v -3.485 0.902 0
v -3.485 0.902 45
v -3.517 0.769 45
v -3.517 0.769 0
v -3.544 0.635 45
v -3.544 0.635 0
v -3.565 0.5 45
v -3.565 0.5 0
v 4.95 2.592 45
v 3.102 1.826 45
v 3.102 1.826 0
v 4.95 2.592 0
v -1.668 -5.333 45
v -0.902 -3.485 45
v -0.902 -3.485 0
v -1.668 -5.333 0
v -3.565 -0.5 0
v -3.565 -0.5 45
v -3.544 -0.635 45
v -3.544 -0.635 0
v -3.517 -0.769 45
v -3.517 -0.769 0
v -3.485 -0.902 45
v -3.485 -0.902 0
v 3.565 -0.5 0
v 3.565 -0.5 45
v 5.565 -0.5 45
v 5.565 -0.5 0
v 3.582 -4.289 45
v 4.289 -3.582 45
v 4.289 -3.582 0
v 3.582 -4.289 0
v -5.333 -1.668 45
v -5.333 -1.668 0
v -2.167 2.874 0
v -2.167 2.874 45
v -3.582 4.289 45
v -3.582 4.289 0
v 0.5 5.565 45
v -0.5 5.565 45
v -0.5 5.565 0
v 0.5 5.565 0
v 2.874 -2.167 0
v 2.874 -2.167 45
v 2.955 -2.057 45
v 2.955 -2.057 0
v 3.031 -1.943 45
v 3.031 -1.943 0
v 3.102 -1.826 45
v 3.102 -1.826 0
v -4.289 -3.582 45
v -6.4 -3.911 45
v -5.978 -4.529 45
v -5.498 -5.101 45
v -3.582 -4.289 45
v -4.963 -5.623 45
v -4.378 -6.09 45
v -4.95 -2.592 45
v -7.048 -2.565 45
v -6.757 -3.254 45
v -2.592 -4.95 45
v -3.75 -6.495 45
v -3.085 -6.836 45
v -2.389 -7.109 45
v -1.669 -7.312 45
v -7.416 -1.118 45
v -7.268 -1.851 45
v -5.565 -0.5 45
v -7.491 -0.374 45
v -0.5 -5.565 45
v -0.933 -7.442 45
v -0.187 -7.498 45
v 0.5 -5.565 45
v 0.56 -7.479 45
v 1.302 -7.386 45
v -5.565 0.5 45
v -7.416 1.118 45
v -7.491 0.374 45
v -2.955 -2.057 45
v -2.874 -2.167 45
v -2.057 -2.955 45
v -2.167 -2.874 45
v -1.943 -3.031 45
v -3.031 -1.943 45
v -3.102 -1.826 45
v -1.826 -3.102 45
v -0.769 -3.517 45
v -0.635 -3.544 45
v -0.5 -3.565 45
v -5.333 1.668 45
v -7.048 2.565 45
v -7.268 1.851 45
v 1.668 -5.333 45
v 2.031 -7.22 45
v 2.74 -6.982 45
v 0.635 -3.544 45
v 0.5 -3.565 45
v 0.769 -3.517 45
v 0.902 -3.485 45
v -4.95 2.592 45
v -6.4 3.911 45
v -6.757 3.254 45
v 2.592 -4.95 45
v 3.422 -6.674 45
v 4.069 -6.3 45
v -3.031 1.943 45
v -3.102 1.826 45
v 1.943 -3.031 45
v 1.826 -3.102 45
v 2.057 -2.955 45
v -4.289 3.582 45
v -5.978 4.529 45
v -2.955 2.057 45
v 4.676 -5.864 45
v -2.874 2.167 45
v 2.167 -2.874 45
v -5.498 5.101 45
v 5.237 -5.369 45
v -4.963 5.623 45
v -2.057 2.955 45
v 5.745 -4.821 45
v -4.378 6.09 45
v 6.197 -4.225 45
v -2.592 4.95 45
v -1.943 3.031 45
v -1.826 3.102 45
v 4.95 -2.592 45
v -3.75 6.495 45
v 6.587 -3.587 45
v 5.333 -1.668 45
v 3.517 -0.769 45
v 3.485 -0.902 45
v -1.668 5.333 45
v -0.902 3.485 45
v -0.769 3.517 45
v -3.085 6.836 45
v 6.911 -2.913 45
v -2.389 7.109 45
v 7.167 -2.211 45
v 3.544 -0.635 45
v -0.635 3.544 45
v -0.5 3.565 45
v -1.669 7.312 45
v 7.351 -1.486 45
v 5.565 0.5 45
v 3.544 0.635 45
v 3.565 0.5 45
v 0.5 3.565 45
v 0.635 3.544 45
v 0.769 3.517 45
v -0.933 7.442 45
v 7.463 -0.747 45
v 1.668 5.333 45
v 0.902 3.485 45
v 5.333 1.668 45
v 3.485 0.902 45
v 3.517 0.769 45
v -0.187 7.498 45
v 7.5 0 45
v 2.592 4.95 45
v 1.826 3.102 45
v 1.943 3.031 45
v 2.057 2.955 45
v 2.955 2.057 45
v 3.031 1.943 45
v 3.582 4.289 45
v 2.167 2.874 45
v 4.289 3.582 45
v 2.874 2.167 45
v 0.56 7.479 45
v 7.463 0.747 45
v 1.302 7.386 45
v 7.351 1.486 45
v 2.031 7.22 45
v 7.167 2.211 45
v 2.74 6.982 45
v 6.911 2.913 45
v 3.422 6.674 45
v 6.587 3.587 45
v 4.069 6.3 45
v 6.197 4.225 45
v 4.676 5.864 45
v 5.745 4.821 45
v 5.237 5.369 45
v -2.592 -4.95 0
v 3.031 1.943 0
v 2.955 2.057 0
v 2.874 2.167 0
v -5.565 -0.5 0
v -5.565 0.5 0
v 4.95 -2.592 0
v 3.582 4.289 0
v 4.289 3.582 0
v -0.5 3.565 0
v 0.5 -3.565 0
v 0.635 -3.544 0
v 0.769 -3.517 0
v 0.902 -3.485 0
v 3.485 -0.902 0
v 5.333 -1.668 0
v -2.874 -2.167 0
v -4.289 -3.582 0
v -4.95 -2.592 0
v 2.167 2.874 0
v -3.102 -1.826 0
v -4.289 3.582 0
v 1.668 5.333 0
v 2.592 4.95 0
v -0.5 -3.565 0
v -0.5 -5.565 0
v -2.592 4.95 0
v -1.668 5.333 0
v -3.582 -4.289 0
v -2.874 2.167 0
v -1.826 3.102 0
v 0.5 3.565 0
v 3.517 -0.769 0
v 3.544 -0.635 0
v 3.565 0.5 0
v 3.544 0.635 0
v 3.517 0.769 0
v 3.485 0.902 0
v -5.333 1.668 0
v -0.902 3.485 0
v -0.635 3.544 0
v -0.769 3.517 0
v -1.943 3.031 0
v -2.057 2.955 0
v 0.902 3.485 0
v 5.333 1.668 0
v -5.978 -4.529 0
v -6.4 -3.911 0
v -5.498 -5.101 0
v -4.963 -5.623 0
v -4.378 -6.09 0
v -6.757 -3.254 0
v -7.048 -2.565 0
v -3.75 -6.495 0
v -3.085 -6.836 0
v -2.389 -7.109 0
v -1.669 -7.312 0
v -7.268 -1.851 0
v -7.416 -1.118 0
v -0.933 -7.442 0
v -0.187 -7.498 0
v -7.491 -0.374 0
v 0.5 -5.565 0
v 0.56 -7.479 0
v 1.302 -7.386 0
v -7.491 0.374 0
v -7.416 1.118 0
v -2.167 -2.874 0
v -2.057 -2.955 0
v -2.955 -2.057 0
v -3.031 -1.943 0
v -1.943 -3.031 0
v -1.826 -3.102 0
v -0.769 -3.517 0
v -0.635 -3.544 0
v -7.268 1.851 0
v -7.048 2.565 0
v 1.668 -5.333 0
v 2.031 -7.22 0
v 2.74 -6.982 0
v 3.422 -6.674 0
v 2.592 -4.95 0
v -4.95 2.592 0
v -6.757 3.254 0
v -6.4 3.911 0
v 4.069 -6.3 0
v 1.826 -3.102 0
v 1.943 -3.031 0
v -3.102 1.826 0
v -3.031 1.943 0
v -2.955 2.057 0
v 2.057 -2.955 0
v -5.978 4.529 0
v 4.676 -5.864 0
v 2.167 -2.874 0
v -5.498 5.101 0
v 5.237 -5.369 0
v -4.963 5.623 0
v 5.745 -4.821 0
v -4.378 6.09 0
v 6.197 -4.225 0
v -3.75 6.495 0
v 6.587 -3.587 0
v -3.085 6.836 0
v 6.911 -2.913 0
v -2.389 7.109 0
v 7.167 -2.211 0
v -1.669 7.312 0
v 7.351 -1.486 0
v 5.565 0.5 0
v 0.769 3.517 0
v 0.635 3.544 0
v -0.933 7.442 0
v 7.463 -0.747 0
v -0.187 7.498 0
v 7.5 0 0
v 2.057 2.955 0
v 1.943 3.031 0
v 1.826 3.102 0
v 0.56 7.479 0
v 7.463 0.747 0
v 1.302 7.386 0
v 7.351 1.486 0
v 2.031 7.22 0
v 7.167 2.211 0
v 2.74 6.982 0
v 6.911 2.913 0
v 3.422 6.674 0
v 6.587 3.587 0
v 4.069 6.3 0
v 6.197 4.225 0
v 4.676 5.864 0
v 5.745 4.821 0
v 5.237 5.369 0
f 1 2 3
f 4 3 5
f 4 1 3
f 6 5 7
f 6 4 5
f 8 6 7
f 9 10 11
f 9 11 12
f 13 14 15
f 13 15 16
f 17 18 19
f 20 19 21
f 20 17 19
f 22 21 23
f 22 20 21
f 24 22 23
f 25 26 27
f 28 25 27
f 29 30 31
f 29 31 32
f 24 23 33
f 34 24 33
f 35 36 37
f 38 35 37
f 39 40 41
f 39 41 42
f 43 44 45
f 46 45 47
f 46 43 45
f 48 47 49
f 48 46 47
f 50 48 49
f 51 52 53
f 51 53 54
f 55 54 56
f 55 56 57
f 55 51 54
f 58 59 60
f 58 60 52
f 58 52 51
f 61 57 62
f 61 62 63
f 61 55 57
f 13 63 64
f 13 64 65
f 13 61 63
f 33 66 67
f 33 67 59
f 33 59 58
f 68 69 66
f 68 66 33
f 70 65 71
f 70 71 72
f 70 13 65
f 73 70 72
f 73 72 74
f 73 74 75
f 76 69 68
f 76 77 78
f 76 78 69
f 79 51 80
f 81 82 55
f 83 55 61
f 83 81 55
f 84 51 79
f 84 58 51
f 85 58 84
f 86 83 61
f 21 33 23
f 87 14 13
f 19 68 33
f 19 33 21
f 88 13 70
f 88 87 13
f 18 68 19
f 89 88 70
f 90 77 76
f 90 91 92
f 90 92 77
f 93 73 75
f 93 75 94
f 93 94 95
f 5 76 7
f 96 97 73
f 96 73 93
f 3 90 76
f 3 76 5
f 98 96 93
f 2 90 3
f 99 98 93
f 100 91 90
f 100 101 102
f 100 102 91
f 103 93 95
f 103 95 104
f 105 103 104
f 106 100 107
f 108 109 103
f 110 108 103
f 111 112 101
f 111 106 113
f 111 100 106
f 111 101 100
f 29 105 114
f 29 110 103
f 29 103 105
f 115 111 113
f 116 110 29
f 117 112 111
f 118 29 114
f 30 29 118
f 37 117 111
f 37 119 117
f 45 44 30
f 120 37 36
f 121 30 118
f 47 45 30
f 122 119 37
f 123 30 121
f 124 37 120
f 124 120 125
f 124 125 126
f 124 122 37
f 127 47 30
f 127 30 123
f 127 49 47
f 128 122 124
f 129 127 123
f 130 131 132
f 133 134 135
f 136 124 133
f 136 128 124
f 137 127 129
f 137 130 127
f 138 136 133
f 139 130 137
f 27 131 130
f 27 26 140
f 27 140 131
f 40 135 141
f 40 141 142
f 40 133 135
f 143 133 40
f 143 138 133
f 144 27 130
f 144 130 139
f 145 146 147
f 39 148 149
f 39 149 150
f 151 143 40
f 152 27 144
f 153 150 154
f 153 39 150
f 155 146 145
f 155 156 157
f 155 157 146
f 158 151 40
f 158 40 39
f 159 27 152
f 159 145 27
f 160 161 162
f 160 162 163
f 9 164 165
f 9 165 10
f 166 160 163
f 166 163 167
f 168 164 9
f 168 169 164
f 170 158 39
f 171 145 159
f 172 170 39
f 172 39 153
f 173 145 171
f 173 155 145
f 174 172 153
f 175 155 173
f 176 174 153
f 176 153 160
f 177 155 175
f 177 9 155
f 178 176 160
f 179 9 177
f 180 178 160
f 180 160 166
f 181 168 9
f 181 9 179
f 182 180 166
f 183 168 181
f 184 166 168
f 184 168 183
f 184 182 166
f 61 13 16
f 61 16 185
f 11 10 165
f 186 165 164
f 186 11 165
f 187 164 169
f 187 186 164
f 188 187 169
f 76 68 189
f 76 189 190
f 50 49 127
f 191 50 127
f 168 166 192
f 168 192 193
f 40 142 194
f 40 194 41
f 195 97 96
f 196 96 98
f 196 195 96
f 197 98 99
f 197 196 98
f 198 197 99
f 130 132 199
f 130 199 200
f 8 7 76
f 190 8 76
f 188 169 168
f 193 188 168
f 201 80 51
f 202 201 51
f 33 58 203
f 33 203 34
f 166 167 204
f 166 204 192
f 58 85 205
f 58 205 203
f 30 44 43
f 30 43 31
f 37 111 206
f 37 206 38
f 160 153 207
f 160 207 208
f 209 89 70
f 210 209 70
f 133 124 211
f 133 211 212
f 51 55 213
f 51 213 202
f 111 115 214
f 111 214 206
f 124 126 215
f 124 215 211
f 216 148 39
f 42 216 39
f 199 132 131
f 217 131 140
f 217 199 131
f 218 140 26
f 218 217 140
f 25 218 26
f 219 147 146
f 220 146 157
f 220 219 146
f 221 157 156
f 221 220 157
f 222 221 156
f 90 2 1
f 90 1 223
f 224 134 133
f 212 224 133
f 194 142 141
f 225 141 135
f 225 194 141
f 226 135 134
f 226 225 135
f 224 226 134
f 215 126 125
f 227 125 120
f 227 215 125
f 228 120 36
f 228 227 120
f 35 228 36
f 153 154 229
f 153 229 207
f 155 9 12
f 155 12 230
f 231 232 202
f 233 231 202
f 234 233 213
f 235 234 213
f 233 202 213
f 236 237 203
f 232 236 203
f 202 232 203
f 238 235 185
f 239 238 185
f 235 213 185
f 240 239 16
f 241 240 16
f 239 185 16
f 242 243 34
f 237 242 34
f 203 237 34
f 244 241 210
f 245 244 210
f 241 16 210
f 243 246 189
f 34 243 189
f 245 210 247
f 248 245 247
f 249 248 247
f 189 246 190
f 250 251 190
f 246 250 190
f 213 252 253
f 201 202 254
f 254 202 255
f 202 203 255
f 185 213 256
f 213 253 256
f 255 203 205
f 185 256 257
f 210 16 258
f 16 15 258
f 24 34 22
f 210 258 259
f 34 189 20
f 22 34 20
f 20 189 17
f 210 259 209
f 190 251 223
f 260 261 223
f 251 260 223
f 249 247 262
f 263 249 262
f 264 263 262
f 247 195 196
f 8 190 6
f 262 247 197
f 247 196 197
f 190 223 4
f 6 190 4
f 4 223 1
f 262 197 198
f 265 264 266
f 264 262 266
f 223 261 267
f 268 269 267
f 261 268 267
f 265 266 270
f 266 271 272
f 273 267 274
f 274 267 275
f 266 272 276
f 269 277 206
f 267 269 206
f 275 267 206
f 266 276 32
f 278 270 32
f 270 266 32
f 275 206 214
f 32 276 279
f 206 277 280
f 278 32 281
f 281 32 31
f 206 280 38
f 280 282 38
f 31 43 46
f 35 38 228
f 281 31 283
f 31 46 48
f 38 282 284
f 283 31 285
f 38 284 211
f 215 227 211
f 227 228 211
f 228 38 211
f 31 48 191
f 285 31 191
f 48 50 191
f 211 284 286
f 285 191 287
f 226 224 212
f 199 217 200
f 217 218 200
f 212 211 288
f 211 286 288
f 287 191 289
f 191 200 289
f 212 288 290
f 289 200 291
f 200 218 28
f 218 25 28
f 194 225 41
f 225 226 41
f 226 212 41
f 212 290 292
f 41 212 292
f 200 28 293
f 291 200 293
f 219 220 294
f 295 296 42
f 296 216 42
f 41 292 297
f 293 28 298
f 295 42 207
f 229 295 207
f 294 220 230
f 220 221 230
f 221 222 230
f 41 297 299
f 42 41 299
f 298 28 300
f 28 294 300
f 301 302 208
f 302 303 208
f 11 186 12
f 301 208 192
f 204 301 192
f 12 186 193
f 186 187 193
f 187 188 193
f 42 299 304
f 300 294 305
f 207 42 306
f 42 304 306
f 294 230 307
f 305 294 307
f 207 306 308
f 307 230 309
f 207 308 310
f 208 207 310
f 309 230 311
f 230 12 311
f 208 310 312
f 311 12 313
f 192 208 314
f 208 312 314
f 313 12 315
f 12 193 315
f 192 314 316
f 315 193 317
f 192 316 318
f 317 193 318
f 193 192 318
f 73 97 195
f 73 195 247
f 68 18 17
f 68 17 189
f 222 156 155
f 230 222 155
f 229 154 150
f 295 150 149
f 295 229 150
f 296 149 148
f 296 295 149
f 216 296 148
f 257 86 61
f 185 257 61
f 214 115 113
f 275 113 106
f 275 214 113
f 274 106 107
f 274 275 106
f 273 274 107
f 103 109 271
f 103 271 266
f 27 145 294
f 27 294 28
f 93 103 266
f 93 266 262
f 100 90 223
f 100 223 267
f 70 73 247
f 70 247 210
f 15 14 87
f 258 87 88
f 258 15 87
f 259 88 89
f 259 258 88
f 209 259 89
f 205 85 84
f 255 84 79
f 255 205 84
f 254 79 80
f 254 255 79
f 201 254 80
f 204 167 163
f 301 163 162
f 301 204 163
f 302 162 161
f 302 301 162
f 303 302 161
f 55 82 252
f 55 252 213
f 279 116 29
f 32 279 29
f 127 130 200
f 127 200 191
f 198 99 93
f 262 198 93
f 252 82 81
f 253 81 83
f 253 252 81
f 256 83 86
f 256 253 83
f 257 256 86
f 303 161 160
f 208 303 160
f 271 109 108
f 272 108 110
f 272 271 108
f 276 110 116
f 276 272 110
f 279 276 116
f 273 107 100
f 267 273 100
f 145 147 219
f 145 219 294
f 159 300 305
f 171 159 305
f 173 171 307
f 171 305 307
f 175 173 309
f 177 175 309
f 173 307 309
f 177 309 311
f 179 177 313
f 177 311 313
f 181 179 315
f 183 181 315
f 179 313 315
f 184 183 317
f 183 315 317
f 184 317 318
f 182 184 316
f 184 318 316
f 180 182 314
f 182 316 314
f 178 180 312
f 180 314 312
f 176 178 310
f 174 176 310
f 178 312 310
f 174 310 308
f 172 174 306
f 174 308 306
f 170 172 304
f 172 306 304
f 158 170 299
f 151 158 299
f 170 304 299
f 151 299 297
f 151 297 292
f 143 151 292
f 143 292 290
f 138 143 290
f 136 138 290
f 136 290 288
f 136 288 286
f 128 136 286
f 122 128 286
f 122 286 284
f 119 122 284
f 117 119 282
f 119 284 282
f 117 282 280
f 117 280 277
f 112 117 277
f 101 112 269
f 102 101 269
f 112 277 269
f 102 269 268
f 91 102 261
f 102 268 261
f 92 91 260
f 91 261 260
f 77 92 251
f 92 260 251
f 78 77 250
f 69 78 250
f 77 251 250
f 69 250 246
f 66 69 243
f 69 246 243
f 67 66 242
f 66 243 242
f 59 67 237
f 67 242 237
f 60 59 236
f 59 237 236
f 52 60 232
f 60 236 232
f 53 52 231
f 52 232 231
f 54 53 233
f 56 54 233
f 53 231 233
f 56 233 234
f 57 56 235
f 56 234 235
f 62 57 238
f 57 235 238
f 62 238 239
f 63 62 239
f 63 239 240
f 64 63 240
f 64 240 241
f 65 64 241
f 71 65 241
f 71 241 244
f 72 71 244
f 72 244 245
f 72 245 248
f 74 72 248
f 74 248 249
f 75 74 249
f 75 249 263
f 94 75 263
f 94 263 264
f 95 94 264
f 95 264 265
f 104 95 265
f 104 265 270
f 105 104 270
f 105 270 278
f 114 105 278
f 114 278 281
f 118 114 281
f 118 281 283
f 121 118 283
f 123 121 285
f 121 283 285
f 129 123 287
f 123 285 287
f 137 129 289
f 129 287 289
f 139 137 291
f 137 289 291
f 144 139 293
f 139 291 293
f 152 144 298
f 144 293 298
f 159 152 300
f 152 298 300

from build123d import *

# Parameters (mm, degrees)
SKETCH_R           = 7.5
SKETCH_R_2         = 3.6
PAD_DEPTH          = 45
SKETCH001_W        = 1
SKETCH001_H        = 2
POCKET_DEPTH       = 45
POLARPATTERN_COUNT = 16


with BuildPart() as part:
    # Sketch → Pad (new body)
    with BuildSketch(Plane.XY):
        Circle(SKETCH_R)
        Circle(SKETCH_R_2, mode=Mode.SUBTRACT)
    extrude(amount=PAD_DEPTH)

    # Sketch001 (on Face4 of Pad) → Pocket (cut)
    with BuildSketch(Plane.XY.offset(45)):
        with Locations((0, 4.565109)):
            Rectangle(SKETCH001_W, SKETCH001_H)
    pocket = extrude(amount=-POCKET_DEPTH, mode=Mode.SUBTRACT)

    # PolarPattern: Pocket ×16 about axis
    polarpattern_axis = Axis((0, 0, 45), (0, 0, 1))
    for i in range(1, POLARPATTERN_COUNT):
        add(pocket.rotate(polarpattern_axis, i * 360 / POLARPATTERN_COUNT), mode=Mode.SUBTRACT)


solid = part.part
